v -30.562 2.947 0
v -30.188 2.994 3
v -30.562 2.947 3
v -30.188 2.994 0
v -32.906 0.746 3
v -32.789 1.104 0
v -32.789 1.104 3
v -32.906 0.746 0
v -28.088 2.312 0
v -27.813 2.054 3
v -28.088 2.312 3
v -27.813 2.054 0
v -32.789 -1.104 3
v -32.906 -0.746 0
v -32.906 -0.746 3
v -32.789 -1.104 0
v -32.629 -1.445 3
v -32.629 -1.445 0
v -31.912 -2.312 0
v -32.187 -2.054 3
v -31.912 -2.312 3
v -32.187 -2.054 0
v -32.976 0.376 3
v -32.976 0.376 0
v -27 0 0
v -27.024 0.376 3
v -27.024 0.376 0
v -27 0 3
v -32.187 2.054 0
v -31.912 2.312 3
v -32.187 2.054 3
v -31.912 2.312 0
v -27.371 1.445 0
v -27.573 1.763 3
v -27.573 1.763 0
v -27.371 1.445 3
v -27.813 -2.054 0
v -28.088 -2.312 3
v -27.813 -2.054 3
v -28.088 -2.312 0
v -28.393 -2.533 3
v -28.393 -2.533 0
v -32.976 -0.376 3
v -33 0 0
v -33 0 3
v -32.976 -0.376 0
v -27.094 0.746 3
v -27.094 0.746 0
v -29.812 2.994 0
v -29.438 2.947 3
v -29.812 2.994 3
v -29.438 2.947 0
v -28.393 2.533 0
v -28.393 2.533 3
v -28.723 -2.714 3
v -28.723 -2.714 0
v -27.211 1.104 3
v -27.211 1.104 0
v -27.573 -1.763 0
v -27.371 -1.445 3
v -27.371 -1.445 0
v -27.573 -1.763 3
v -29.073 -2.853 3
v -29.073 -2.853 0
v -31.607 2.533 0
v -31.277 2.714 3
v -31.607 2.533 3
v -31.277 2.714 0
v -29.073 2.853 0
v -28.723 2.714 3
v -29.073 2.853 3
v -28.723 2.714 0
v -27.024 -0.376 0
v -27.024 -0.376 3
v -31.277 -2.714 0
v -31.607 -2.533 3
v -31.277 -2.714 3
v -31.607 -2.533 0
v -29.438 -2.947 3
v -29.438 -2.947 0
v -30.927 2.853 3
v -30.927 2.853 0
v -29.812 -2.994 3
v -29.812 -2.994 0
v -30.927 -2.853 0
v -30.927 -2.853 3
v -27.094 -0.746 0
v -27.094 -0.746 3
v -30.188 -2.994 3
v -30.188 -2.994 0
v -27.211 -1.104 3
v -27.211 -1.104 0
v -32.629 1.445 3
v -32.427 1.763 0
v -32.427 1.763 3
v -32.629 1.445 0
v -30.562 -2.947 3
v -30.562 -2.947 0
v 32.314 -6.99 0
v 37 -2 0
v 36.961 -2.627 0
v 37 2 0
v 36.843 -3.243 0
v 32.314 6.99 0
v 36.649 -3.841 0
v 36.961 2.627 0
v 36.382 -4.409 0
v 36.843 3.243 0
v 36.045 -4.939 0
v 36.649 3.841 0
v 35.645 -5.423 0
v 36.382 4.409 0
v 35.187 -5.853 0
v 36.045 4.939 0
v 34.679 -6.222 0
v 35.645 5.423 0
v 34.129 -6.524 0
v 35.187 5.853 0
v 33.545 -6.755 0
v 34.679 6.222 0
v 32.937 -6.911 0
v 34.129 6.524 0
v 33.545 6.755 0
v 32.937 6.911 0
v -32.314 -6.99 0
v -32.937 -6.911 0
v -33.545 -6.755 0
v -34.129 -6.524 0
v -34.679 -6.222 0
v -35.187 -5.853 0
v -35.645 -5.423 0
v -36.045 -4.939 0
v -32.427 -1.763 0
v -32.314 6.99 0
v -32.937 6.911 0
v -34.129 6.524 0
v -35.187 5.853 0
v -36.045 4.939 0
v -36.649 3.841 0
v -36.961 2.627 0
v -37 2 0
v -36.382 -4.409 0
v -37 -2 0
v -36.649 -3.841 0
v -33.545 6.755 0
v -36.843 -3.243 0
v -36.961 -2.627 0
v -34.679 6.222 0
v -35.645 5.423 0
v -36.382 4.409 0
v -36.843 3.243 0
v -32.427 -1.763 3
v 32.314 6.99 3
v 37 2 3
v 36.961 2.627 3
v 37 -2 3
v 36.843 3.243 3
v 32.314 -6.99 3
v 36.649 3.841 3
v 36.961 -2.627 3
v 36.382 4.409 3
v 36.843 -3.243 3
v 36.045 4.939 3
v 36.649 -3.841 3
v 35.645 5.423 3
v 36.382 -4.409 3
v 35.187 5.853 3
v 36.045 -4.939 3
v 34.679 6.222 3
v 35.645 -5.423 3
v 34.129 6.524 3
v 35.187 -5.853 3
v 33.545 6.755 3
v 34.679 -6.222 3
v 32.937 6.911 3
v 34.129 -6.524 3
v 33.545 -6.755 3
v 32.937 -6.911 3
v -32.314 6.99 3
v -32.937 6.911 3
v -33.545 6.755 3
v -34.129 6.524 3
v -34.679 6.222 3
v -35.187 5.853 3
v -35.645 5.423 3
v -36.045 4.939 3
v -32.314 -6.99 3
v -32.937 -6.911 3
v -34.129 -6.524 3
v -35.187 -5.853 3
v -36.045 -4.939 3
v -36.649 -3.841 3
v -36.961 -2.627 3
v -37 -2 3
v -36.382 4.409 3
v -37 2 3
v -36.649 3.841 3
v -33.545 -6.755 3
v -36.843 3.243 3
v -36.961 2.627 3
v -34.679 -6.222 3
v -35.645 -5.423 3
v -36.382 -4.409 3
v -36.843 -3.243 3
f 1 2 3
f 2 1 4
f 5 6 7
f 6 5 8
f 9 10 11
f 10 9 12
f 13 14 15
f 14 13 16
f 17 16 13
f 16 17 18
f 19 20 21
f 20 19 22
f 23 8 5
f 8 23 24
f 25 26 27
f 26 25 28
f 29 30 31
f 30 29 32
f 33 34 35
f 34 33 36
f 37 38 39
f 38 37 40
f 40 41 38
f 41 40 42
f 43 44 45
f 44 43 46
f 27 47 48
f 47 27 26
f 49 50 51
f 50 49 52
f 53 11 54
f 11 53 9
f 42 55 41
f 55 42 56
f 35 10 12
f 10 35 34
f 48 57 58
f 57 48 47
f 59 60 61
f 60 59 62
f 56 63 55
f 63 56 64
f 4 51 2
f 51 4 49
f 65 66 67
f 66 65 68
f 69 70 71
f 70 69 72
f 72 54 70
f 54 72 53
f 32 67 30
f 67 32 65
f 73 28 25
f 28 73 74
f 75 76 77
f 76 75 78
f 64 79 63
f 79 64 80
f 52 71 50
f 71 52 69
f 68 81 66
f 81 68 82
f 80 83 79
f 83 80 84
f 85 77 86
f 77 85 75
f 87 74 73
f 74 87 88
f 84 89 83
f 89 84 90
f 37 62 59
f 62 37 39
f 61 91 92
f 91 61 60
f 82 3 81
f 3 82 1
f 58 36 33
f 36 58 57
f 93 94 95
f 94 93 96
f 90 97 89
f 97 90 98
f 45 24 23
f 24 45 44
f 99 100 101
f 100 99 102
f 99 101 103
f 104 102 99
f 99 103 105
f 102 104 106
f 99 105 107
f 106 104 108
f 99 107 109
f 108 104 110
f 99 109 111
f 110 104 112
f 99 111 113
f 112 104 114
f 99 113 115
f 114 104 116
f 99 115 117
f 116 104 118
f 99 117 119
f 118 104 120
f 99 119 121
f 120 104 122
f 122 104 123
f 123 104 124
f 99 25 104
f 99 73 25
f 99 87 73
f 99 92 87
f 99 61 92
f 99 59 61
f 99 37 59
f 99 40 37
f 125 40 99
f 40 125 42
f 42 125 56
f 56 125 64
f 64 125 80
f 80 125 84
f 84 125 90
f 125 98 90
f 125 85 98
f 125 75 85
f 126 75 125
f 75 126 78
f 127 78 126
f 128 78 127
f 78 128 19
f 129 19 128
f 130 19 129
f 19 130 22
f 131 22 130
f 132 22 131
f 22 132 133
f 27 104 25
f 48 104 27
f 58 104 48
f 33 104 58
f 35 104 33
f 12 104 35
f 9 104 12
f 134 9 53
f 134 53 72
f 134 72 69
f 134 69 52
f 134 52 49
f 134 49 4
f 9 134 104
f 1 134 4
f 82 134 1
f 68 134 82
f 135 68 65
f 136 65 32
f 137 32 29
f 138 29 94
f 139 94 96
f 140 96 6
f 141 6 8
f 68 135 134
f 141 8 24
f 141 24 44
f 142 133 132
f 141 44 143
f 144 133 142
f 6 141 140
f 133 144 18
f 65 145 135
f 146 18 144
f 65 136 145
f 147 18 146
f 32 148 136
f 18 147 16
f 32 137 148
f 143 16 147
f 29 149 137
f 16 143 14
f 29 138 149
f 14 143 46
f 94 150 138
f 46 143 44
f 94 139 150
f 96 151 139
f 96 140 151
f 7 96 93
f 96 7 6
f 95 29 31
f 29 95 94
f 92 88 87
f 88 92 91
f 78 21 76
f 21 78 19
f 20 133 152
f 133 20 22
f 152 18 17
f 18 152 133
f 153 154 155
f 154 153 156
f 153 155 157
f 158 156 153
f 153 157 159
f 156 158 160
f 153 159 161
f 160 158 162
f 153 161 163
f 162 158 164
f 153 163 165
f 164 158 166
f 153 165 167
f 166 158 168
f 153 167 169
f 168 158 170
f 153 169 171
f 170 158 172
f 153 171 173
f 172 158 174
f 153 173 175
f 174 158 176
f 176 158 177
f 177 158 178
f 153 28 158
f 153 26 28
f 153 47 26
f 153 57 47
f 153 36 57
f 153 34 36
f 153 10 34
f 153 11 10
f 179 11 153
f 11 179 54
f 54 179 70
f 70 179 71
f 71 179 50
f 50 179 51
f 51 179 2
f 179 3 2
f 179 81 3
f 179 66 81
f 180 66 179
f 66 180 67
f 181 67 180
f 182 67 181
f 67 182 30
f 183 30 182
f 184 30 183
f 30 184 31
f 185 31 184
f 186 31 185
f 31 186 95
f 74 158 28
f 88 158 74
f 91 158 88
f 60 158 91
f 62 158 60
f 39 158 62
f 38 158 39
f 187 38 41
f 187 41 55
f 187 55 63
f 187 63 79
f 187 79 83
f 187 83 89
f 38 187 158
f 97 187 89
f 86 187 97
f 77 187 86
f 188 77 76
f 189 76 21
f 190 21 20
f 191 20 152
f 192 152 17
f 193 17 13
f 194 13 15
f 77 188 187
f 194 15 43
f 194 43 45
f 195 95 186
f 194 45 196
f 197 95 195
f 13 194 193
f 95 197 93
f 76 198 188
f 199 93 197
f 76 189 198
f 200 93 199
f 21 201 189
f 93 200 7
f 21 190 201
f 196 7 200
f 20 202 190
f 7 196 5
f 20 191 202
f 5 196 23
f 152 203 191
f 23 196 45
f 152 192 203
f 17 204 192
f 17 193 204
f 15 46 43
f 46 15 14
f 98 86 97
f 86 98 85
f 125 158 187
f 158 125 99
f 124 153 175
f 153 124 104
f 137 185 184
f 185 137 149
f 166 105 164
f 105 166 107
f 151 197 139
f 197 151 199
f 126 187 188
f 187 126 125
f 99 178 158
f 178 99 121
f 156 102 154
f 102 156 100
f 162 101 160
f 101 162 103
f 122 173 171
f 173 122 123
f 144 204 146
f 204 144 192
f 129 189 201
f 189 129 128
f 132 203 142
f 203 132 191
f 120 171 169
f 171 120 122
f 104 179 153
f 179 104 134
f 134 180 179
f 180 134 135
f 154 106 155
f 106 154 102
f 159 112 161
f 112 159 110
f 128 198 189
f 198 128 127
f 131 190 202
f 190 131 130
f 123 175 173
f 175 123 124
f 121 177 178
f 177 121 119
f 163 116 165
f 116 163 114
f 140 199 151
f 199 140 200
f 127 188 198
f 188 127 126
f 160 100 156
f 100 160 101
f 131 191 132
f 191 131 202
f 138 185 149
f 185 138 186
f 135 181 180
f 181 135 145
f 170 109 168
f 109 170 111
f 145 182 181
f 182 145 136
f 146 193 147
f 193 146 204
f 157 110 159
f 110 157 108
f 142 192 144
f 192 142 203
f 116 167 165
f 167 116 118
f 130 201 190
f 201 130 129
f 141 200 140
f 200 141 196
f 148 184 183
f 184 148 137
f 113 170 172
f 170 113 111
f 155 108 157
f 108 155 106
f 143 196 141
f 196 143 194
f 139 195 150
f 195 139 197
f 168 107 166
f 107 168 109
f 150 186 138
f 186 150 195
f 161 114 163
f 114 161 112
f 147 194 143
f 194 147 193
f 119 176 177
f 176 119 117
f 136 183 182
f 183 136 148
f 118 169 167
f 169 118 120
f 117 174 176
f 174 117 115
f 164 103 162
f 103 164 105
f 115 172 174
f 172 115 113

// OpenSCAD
$fn = 50;


difference() {
	union() {
		hull() {
			translate(v = [-32.0000000000, 2.0000000000, 0]) {
				cylinder(h = 3, r = 5);
			}
			translate(v = [32.0000000000, 2.0000000000, 0]) {
				cylinder(h = 3, r = 5);
			}
			translate(v = [-32.0000000000, -2.0000000000, 0]) {
				cylinder(h = 3, r = 5);
			}
			translate(v = [32.0000000000, -2.0000000000, 0]) {
				cylinder(h = 3, r = 5);
			}
		}
	}
	union() {
		translate(v = [-30.0000000000, 0.0000000000, 0]) {
			cylinder(h = 3, r = 3.0000000000);
		}
		translate(v = [-30.0000000000, 0.0000000000, 0]) {
			cylinder(h = 3, r = 1.5000000000);
		}
		translate(v = [-30.0000000000, 0.0000000000, 0]) {
			cylinder(h = 3, r = 1.5000000000);
		}
		translate(v = [-30.0000000000, 0.0000000000, 0]) {
			cylinder(h = 3, r = 1.5000000000);
		}
	}
}
